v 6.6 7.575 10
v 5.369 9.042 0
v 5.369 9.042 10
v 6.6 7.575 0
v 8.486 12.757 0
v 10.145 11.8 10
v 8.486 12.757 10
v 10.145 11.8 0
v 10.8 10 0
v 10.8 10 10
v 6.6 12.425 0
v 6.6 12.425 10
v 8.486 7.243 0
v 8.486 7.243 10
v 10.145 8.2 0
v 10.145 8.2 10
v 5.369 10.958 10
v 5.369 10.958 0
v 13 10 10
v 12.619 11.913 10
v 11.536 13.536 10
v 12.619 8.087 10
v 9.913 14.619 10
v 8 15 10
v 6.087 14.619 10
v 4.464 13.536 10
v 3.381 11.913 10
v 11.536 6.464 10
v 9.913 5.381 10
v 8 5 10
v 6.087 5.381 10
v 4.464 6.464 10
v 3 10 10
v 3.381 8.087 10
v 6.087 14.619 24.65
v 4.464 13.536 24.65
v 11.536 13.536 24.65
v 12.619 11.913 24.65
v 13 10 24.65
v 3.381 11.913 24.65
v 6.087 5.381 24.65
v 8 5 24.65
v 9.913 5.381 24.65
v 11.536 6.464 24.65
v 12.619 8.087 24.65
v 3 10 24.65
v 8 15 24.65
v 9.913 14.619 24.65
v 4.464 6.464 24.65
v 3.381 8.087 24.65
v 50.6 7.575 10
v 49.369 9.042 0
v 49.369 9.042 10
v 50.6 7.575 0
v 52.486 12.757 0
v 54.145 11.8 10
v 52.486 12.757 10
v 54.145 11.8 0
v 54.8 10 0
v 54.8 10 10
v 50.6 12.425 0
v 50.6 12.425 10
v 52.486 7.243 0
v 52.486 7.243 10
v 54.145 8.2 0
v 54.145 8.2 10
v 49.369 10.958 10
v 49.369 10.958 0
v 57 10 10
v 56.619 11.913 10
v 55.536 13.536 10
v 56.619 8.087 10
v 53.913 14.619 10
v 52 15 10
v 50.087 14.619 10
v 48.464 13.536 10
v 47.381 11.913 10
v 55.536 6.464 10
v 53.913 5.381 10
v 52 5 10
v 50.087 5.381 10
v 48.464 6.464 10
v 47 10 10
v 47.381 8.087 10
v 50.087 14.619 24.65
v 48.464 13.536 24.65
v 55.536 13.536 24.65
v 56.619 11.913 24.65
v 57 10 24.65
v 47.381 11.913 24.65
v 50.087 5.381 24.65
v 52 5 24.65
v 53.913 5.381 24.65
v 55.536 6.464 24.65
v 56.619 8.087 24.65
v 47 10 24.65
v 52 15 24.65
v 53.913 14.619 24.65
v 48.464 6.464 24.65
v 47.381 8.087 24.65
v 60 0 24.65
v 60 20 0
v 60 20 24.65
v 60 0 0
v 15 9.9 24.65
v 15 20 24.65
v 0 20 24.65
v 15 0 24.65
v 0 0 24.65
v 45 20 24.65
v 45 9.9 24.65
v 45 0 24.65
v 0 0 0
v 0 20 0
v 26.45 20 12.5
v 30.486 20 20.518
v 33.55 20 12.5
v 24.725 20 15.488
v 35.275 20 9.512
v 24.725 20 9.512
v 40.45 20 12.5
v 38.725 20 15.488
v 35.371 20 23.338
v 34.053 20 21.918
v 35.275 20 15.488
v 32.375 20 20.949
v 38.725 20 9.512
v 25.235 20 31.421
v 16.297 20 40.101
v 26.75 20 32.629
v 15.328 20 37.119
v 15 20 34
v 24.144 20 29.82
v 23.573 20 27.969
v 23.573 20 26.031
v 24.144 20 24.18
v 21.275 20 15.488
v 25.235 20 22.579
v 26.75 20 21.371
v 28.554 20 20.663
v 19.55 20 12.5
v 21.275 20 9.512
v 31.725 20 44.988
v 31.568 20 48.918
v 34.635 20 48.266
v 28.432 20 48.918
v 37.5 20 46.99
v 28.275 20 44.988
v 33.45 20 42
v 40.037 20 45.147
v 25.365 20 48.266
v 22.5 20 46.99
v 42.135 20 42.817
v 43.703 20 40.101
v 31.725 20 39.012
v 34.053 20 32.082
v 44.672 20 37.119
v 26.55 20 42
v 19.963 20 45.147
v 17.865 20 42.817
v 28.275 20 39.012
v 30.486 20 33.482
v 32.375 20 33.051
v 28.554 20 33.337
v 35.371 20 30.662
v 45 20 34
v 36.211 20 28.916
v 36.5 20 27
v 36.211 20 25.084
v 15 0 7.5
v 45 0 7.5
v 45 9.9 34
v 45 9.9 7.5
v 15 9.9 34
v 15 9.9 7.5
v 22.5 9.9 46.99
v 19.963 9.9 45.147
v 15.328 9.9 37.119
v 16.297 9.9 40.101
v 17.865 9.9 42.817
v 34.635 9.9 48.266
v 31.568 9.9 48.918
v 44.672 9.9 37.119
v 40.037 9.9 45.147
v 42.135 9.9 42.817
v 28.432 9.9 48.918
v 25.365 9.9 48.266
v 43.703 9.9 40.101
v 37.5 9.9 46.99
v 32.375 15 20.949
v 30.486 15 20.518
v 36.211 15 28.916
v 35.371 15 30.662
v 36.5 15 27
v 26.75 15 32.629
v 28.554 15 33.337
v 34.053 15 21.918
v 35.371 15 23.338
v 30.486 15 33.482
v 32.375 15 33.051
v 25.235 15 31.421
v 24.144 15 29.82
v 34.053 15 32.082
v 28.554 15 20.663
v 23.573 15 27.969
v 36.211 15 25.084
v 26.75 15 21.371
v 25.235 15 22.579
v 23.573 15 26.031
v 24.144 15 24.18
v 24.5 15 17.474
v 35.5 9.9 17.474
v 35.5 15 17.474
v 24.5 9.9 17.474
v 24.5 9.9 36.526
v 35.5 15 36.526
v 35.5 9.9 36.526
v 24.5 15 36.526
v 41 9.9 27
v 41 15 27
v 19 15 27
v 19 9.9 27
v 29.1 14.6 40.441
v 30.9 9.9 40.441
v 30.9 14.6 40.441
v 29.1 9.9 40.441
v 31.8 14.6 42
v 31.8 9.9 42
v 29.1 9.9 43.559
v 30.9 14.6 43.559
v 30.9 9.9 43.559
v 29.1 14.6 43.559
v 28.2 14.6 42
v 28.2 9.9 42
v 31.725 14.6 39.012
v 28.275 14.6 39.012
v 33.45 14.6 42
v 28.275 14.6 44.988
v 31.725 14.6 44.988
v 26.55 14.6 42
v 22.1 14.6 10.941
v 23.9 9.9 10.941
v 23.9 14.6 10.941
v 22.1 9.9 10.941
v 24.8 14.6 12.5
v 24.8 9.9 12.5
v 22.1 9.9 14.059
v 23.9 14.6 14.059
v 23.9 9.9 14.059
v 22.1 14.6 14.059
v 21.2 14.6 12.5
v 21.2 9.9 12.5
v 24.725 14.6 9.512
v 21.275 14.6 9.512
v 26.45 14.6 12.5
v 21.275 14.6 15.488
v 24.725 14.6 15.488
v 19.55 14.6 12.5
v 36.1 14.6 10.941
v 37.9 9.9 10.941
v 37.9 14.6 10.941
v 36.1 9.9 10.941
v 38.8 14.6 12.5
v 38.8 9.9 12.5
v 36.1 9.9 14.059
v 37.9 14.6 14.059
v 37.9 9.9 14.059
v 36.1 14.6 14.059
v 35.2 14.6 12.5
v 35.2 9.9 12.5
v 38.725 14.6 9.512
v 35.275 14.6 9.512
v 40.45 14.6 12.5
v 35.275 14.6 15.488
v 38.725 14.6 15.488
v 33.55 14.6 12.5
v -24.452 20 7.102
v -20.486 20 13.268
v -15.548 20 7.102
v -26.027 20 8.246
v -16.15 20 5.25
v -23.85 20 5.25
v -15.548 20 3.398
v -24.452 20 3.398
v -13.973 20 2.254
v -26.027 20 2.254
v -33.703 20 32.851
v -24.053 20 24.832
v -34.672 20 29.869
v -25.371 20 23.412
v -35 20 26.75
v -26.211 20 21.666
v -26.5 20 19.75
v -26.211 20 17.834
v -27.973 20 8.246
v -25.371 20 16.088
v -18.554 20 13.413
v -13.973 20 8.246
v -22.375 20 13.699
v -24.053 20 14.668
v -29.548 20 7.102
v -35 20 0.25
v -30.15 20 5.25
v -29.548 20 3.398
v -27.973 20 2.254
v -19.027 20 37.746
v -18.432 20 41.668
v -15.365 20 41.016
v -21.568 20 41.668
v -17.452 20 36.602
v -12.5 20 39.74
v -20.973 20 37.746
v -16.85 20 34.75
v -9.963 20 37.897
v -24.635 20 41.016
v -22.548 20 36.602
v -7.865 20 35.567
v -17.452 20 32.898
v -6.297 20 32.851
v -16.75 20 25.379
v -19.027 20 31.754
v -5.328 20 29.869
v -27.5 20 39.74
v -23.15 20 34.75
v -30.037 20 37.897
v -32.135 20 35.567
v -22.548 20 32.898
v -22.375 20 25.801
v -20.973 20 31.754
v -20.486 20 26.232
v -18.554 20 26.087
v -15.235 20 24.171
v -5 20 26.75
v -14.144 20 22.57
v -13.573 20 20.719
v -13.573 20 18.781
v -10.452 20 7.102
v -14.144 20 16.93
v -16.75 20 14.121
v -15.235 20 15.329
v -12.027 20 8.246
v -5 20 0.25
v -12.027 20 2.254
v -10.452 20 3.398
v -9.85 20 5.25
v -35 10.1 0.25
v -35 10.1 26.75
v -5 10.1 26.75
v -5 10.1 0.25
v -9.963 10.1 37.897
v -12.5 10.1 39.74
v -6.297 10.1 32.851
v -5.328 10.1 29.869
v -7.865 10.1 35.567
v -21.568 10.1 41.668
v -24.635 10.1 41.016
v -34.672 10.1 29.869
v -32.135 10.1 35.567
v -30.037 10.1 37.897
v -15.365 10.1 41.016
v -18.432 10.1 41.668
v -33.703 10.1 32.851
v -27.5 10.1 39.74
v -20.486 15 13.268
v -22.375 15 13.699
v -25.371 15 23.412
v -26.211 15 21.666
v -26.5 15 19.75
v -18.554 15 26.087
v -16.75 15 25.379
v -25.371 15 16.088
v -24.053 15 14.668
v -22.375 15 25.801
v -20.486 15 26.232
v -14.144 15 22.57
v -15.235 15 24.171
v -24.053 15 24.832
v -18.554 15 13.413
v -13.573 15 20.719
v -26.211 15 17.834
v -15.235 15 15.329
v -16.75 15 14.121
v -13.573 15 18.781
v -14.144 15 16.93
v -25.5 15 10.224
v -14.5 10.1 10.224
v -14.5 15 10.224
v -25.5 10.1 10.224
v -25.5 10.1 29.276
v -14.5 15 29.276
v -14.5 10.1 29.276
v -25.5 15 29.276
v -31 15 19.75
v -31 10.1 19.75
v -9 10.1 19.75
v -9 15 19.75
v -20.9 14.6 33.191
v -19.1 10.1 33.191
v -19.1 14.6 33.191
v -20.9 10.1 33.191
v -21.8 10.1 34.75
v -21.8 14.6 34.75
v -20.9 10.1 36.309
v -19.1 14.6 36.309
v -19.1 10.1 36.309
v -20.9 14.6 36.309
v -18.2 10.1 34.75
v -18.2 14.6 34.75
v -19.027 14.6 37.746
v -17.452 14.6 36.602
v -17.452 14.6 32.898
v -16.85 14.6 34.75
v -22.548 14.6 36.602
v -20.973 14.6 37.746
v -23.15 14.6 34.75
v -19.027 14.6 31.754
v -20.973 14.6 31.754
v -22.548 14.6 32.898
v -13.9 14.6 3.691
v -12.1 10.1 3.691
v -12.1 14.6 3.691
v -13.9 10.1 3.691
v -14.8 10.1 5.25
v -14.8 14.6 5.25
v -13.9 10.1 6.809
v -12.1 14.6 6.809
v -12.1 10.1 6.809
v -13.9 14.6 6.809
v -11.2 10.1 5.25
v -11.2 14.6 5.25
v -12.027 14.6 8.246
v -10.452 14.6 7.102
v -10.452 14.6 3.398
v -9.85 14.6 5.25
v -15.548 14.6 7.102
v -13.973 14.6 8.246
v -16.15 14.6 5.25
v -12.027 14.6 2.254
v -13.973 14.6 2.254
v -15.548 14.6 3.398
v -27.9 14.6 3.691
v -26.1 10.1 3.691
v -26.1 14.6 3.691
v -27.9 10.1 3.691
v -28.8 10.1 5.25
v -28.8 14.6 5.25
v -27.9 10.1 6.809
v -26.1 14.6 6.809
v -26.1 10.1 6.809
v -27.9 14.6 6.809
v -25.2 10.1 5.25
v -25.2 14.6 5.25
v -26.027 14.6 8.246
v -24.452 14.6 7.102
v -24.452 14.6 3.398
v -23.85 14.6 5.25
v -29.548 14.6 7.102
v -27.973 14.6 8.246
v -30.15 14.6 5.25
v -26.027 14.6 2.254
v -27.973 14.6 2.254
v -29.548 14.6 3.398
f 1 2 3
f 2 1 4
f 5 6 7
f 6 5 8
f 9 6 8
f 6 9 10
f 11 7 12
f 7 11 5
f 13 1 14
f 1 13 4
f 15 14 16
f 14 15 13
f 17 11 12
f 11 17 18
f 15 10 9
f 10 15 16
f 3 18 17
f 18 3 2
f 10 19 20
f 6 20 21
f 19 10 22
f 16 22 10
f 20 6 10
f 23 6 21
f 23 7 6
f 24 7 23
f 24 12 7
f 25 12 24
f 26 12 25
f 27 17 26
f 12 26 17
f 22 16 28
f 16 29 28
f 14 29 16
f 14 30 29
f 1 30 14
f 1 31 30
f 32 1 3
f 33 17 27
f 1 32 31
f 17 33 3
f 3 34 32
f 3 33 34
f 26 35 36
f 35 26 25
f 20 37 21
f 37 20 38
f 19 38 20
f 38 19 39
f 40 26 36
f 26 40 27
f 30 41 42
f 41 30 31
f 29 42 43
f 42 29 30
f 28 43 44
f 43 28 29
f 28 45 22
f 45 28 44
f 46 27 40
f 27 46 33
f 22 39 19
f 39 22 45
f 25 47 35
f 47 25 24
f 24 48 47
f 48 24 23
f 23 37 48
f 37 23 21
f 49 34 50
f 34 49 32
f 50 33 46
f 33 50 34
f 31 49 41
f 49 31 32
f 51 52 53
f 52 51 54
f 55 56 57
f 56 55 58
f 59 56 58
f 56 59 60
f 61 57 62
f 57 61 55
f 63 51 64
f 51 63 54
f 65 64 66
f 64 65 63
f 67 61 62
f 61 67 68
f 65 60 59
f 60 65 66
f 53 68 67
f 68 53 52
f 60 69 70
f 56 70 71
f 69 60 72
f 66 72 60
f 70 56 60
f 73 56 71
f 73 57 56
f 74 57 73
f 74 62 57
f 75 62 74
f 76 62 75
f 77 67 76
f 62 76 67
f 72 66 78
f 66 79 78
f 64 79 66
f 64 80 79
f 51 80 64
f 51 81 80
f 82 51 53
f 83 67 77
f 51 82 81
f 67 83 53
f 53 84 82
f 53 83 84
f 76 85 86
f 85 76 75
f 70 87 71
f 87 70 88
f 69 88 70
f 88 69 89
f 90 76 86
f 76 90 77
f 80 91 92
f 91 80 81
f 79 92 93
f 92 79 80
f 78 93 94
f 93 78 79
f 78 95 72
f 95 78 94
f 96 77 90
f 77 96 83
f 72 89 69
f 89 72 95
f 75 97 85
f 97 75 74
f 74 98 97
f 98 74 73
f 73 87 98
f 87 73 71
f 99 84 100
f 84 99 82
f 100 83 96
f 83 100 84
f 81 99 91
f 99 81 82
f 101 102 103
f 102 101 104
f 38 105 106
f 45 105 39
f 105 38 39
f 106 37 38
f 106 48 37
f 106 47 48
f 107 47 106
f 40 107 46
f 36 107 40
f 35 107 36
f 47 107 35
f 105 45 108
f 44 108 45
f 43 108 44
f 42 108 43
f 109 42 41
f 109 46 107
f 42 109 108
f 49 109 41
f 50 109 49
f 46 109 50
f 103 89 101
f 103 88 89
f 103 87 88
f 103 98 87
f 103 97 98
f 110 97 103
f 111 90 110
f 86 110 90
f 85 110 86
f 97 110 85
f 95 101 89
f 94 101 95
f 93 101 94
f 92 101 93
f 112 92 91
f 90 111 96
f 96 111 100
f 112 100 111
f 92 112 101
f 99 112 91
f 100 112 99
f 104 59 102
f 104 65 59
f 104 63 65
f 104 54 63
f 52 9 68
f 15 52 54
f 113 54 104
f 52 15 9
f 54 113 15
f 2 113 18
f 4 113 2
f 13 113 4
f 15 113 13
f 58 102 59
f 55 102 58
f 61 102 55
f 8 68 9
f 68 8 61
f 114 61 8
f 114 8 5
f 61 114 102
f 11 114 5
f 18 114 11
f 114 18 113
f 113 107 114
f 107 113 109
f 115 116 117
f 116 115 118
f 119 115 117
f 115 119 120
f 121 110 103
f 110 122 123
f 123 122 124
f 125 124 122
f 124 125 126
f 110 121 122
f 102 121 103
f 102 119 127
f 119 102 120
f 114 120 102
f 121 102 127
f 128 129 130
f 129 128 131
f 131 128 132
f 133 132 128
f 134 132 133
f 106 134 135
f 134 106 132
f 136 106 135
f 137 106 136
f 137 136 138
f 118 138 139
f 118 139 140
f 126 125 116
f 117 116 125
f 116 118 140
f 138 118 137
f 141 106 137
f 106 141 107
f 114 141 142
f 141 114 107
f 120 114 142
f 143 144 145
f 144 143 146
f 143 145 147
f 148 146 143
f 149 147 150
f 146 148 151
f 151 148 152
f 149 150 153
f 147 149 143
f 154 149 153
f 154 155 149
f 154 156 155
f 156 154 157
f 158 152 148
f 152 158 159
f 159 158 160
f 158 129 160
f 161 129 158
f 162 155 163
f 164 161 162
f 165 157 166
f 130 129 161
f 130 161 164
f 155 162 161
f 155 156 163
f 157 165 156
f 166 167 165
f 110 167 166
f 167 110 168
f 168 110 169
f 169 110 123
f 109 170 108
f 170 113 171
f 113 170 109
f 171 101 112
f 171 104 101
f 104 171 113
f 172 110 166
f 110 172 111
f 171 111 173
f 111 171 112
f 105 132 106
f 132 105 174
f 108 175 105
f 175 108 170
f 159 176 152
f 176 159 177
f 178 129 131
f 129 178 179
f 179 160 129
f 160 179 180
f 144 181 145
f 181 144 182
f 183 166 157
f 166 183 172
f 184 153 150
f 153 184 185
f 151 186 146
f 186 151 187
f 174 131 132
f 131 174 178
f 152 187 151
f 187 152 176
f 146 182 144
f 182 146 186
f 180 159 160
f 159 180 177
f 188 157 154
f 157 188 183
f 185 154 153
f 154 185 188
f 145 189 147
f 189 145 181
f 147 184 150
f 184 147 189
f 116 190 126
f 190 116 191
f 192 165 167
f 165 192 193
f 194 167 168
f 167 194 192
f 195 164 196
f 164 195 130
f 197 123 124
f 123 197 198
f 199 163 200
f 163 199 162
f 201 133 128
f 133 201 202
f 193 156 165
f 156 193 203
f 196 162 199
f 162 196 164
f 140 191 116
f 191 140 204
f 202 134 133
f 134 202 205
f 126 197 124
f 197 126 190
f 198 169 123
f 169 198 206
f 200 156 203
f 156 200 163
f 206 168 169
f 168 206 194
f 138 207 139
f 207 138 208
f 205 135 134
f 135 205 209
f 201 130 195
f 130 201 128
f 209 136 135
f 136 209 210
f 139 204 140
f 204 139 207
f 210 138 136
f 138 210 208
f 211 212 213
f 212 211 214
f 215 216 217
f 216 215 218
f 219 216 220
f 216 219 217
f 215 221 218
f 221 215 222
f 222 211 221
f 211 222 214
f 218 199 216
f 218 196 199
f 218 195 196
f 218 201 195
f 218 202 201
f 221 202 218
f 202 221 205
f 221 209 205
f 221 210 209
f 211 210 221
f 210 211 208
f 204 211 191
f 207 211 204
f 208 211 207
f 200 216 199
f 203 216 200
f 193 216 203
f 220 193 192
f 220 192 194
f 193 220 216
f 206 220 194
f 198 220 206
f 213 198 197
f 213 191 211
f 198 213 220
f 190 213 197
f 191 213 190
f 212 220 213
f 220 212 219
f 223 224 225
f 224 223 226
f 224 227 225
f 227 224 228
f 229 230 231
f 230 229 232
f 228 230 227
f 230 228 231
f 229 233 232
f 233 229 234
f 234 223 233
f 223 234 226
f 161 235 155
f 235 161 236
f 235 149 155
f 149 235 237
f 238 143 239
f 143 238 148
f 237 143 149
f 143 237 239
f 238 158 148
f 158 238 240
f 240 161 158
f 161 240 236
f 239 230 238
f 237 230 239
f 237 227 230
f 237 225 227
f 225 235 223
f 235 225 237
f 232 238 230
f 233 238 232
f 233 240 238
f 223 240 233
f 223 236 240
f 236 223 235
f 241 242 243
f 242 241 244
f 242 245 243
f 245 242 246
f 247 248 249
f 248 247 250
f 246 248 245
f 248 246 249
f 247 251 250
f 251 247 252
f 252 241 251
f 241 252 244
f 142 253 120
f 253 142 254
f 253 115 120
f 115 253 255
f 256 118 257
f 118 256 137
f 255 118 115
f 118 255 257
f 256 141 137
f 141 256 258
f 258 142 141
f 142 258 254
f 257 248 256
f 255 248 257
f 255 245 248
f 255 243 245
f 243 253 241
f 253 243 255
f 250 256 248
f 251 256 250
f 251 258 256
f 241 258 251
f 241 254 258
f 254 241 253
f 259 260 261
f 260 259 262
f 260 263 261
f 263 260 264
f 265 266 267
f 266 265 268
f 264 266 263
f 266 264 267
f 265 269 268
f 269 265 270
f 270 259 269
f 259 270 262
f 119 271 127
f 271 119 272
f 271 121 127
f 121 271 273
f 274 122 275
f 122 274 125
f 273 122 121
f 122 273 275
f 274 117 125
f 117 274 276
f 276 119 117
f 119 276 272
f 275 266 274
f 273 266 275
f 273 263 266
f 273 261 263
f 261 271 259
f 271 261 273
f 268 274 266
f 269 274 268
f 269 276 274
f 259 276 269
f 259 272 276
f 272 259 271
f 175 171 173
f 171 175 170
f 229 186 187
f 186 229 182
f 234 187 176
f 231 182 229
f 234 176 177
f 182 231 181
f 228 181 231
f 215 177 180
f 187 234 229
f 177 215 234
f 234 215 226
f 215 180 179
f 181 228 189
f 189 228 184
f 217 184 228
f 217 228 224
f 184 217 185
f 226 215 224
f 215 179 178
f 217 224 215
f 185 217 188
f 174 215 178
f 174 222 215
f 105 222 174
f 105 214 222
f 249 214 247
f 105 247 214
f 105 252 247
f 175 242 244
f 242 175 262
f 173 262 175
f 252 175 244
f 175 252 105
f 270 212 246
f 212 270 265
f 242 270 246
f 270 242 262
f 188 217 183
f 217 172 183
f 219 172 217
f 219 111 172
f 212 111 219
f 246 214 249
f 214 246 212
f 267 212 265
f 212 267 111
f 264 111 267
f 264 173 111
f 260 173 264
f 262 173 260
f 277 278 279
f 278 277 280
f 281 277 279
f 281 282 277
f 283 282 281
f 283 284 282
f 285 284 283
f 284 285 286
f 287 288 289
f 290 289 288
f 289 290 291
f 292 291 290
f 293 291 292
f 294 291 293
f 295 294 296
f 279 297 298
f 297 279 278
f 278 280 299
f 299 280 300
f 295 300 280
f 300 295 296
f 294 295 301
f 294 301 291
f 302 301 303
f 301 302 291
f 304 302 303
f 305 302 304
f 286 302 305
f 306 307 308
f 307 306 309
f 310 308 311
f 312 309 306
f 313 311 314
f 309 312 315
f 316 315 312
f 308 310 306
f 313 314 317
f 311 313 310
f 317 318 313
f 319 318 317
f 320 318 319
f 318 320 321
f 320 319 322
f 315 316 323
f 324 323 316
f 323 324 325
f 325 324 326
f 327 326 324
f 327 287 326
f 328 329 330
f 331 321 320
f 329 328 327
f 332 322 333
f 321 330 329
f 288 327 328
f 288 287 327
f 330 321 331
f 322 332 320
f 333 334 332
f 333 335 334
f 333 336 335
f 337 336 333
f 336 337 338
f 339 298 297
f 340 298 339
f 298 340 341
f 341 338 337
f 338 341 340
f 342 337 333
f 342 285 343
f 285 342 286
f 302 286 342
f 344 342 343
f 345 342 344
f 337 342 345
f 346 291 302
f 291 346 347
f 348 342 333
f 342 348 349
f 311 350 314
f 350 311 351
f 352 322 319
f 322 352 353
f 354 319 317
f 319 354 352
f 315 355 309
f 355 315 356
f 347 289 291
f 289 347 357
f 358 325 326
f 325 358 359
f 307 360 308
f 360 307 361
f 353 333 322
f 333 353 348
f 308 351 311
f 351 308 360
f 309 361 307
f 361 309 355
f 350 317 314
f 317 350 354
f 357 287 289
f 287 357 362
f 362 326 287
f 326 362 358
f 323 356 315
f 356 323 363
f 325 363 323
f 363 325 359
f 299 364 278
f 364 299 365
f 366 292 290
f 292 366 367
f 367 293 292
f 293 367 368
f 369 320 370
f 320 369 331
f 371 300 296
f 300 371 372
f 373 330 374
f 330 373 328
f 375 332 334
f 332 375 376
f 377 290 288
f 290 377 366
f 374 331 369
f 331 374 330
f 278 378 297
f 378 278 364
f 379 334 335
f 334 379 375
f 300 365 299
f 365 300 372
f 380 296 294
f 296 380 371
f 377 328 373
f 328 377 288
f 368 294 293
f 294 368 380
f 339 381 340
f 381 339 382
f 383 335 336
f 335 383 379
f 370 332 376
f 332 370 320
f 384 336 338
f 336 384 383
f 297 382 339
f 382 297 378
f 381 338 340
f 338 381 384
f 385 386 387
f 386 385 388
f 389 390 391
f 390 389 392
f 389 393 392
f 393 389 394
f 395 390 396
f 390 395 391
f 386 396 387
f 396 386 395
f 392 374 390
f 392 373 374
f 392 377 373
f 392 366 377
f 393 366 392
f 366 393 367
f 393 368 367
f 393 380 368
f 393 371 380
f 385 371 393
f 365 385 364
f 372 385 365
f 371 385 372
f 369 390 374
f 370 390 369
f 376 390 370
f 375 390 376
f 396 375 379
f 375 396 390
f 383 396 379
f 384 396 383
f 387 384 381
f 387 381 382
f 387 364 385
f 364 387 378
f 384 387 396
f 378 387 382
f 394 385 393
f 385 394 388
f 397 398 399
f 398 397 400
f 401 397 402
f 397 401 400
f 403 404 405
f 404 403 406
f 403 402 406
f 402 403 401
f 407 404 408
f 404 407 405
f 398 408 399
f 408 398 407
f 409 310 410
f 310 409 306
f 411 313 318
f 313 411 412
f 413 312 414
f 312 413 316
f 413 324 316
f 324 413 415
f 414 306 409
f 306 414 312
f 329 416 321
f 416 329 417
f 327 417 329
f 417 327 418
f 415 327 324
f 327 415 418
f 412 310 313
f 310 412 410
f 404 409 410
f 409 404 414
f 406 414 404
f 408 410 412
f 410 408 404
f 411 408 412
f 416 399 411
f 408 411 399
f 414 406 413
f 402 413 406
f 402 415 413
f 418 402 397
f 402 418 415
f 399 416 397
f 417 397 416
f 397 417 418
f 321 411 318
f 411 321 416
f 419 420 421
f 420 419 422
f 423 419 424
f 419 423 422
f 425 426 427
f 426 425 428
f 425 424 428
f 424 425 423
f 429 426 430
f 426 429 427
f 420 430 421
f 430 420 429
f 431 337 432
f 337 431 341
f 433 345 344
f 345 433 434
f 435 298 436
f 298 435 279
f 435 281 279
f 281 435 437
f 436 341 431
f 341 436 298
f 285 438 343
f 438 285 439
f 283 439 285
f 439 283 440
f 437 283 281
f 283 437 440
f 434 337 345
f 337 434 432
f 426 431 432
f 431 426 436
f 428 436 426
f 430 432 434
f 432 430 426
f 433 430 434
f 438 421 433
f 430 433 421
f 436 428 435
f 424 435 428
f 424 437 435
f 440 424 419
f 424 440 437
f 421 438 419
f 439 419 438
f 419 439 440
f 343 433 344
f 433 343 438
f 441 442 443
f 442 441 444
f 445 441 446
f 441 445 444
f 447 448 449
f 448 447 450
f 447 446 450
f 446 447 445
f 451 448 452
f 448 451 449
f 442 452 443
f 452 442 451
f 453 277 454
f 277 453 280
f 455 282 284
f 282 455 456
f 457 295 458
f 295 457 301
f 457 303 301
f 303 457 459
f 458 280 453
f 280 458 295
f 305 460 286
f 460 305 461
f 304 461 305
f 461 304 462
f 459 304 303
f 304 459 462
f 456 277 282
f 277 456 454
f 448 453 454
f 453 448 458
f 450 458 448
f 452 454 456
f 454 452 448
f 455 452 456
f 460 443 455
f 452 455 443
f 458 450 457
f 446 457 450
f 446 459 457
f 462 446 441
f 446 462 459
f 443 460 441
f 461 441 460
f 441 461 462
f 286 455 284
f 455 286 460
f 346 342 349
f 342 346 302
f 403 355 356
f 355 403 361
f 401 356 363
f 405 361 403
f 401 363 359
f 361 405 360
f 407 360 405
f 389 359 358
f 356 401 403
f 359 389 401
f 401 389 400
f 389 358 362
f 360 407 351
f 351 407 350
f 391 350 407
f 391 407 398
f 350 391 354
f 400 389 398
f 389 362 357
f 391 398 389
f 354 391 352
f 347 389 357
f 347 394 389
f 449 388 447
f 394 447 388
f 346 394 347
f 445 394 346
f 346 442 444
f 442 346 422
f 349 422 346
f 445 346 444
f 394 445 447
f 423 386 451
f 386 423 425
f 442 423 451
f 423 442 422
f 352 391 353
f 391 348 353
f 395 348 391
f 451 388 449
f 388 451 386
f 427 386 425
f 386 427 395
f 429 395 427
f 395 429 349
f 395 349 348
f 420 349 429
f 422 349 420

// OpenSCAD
//include <bearing.scad>;
//include <screw.scad>;

wheelDiameter=77.5;
wheelRadius=wheelDiameter/2;
clearance=0.15;
//profileWidth = 20+(clearance*2);
profileWidth = 20;
screwSpace = 15;
wallThickness = 5;
bockLength=60;

ballNutRadius=22/2;
ballNutHeight=10;

axisBodyDiameter = 20+(2*wallThickness);
axisBodyRadius = axisBodyDiameter/2;

axisDiameter = 13;
axisRadius = axisDiameter/2;

axisInsideWidth=11.55;
axisOutsideWidthHalf=6.55;

//axis_width=24.65;
axis_width=axisInsideWidth+(2*axisOutsideWidthHalf);

bugelWidth=30;

profileHeight=20;
slotWidth=4.5;
slotHeight=0.6;

bearingWidth=5;

screwDistance=27;

getMain();

	
module getMain() {
//	difference(){
//		axisTwo();
//		#translate([(bockLength/2)-(bugelWidth/2),-0.1,7.5])cube([bugelWidth,profileWidth/2,100]);
//	}
	halfOne();
	translate([10,0,-7.25])halfTwo();
//		axisTwo();
//		reference_grid(-20,20,-20,20,-20,20,1,1,1);
}

module halfOne(){
	difference(){
		axisTwo();
		#translate([(bockLength/2)-(bugelWidth/2),-0.1,7.5])cube([bugelWidth,profileWidth/2,100]);
	}
}
module halfTwo(){
	translate([0,profileWidth,0])rotate([0,0,180])
//	mirror([0,1,0])
	difference(){
		axisTwo();
		 halfOne();
	}
	
}

module axisTwo() {
	difference(){
	union(){
		
		difference(){
			cube([bockLength,profileWidth,axis_width]);
//			translate([-bockLength/2,-5,-5-wheelRadius])profile5_40x40(100);
			translate([0+8,profileWidth/2,-10])m5Screw(20);
			translate([bockLength-8,profileWidth/2,-10])m5Screw(20);
			
			translate([(bockLength/2)-15,0,0])hull(){
				translate([0,0,0])cube([30,profileWidth,17]);	
				translate([axisBodyRadius,profileWidth,screwDistance])rotate([90,0,0])cylinder(h=profileWidth,r=axisBodyRadius);
			}
		}
		
		difference(){
			translate([(bockLength/2)-15,0,0])bugel();
//					union(){
////						rotate([90,0,0])bearing();
//						
//					}
		}
//		translate([0,18.5,0])difference(){
//			bugel();
//			translate([25,4.1,35])union(){
//				rotate([90,0,0])bearing();
//				rotate([90,0,0])cylinder(h=axisInsideWidth,r=axisRadius);
//			}
//		}

	}
	translate([bockLength/2,profileWidth,screwDistance+15])rotate([90,0,0])m3Screw();
	translate([bockLength/2-7,profileWidth,12.5])rotate([90,0,0])m3Screw();
	translate([bockLength/2+7,profileWidth,12.5])rotate([90,0,0])m3Screw();
	}
    
    
}



module bugel() {
	difference() {
		hull(){
			translate([0,0,0])cube([bugelWidth,profileWidth,17]);	
			translate([axisBodyRadius,profileWidth,screwDistance+7])rotate([90,0,0])cylinder(h=profileWidth,r=axisBodyRadius);
		}
		translate([axisBodyRadius,profileWidth*1.5,screwDistance])rotate([90,0,0])cylinder(h=profileWidth*2,r=axisRadius);
		translate([axisBodyRadius,(profileWidth/2)+ballNutHeight/2,screwDistance])rotate([90,0,0])cylinder(h=ballNutHeight,r=ballNutRadius,$fn=6);
//		translate([axisBodyRadius,profileWidth+1,screwDistance])rotate([90,0,0])cylinder(h=2,r1=ballNutRadius+2,r2=ballNutRadius,$fn=6);
	}

}

//module axisOne() {
//		union(){
//			translate([25,axisInsideWidth+(10-axisInsideWidth/2),35])axisInsideConector();
//			difference(){
//				translate([-40,-wallThickness,profileWidth])plug20x20(50);
//				translate([-25,(profileWidth)/2,35])rotate([0,0,0])m5Hole(25);
//				translate([-25,(profileWidth)/2,35])rotate([90,0,0])m5Hole(25);
//				translate([-25,(profileWidth)/2,35])rotate([180,0,0])m5Hole(25);
//				translate([-25,(profileWidth)/2,35])rotate([270,0,0])m5Hole(25);
//				translate([-100,-clearance,(profileWidth+wallThickness)-clearance])cube([100,profileWidth+(clearance*2),profileWidth+(clearance*2)]);
//			}
//		}
//}

//module axisInsideConector() {
//	difference(){
//	   hull(){
//		   translate([-16,-11.55,-15])cube([15,axisInsideWidth,20+(wallThickness*2)]);
//		   rotate([90,0,0])cylinder(h=axisInsideWidth,r=axisBodyRadius);
//	   }
//	   translate([0,0.01,0])rotate([90,0,0])bearing();
//		translate([0,-axisInsideWidth+bearingWidth-0.01,0])rotate([90,0,0])bearing();
//		translate([0,0,0])rotate([90,0,0])cylinder(h=axisInsideWidth,r=axisRadius);
//   }
//}
//module axisInside() {
//	difference(){
//		rotate([90,0,0])bearing();
//		translate([0,-axisInsideWidth+bearingWidth,0])rotate([90,0,0])bearing();
//		translate([0,0,0])rotate([90,0,0])cylinder(h=axisInsideWidth,r=axisRadius);
//	}
//}
//module axisOutside() {
//		rotate([90,0,0])cylinder(h=axisOutsideWidthHalf,r=axisBodyRadius);
//}

//module bearing() {
//	cylinder(h=bearingWidth,r=13.4/2);
//}


module m5Screw(h=10) {
	union() {
		cylinder(h=h,r=2.8);
		translate([0,0,h])cylinder(h=20,r=5);
	}
}

module m3Screw(h=15) {
	union() {
		translate([0,0,5])cylinder(h=h+5,r=3.6/2);
//		cylinder(h=5,r=3.6/2);
		#translate([0,0,h-0.4])cylinder(h=5.5,r=6.3/2);
		translate([0,0,-0.1])cylinder(h=5.5,r=6.9/2,$fn=6);
	}
}

module m5Hole(h=20) {
	union() {
		cylinder(h=h,r=2.8);
//		translate([0,0,h])cylinder(h=20,r=5);
	}
}

//module plug20x20(l=100) {
//	cube([l,20+(2*wallThickness),20+(2*wallThickness)]);
//   	
//}

//module profile5_20x20(l=100) {
//	difference(){
//		cube([l,profileWidth,profileWidth]);
//	}
//	
//}

//module profile5_40x40(l=100) {
//	union(){
//		profile5_20x20(l);
//		translate([0,20,0])profile5_20x20(l);
//		translate([0,20,20])profile5_20x20(l);
//		translate([0,0,20])profile5_20x20(l);
//	}
//	
//}


//reference grid

module reference_grid(minx,maxx,miny,maxy,minz,maxz,dx,dy,dz) {
  for(dxi=[minx:dx:maxx])
    for(dyi=[miny:dy:maxy])
      for(dzi=[minz:dz:maxz]) translate([dxi,dyi,dzi])
% cube(size=[dx/10,dy/10,dz/10],center=true);
}

//reference_grid(-2,2,-2,2,-2,2,1,1,1);// reference grid
